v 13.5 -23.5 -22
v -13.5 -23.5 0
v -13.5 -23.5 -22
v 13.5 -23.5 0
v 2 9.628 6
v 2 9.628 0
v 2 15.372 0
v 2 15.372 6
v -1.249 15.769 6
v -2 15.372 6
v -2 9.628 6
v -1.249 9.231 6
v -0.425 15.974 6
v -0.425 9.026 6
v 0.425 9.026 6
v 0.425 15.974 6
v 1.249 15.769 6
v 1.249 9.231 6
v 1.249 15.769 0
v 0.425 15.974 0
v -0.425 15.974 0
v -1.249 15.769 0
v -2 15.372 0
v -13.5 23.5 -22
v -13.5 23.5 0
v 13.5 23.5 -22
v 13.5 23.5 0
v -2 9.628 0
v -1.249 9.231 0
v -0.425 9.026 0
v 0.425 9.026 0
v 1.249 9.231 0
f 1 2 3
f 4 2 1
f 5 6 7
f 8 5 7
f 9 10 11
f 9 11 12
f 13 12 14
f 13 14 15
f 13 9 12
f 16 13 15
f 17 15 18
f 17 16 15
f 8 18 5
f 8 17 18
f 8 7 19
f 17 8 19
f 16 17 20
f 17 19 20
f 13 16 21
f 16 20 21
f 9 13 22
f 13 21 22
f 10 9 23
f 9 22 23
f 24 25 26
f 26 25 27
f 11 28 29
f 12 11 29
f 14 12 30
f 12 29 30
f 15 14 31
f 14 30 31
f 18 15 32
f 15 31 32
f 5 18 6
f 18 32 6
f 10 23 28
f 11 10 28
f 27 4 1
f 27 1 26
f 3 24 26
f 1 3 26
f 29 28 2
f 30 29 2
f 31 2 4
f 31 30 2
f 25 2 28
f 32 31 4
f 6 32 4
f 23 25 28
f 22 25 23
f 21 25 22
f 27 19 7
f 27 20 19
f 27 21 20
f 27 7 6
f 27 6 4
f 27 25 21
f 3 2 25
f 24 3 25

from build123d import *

# Parameters (mm, degrees)
F1_DEPTH = 6
F0_W     = 27
F0_H     = 47
F0_R     = 9.5
F2_DEPTH = 22
F3_DEPTH = 22


with BuildPart() as f1:
    # F0 (on Top) → F1 (new body)
    with BuildSketch(Plane.XY):
        with BuildLine():
            Line((2, 9.6277186767), (2, 15.3722813233))
            ThreePointArc((2, 15.3722813233), (0, 16), (-2, 15.3722813233))
            Line((-2, 15.3722813233), (-2, 9.6277186767))
            ThreePointArc((-2, 9.6277186767), (0, 9), (2, 9.6277186767))
        make_face()
    extrude(amount=F1_DEPTH)

    # F0 (on Top) → F2 (join)
    with BuildSketch(Plane.XY):
        Rectangle(F0_W, F0_H)
        with Locations((0, 12.5)):
            Circle(F0_R, mode=Mode.SUBTRACT)
        with Locations((0, 12.5)):
            Circle(F0_R)
        with BuildLine():
            ThreePointArc((2, 15.3722813233), (3.1024184115, 14.1201851746), (3.5, 12.5))
            ThreePointArc((3.5, 12.5), (3.1024184115, 10.8798148254), (2, 9.6277186767))
            ThreePointArc((2, 9.6277186767), (0, 9), (-2, 9.6277186767))
            ThreePointArc((-2, 9.6277186767), (-3.5, 12.5), (-2, 15.3722813233))
            ThreePointArc((-2, 15.3722813233), (0, 16), (2, 15.3722813233))
        make_face(mode=Mode.SUBTRACT)
        with BuildLine():
            Line((-2, 9.6277186767), (-2, 15.3722813233))
            ThreePointArc((-2, 15.3722813233), (-3.5, 12.5), (-2, 9.6277186767))
        make_face()
        with BuildLine():
            ThreePointArc((2, 9.6277186767), (3.1024184115, 10.8798148254), (3.5, 12.5))
            ThreePointArc((3.5, 12.5), (3.1024184115, 14.1201851746), (2, 15.3722813233))
            Line((2, 15.3722813233), (2, 9.6277186767))
        make_face()
    extrude(amount=-F2_DEPTH)

    # F0 (on Top) → F3 (join)
    with BuildSketch(Plane.XY):
        with BuildLine():
            Line((2, 9.6277186767), (2, 15.3722813233))
            ThreePointArc((2, 15.3722813233), (0, 16), (-2, 15.3722813233))
            Line((-2, 15.3722813233), (-2, 9.6277186767))
            ThreePointArc((-2, 9.6277186767), (0, 9), (2, 9.6277186767))
        make_face()
    extrude(amount=-F3_DEPTH)


solid = f1.part
